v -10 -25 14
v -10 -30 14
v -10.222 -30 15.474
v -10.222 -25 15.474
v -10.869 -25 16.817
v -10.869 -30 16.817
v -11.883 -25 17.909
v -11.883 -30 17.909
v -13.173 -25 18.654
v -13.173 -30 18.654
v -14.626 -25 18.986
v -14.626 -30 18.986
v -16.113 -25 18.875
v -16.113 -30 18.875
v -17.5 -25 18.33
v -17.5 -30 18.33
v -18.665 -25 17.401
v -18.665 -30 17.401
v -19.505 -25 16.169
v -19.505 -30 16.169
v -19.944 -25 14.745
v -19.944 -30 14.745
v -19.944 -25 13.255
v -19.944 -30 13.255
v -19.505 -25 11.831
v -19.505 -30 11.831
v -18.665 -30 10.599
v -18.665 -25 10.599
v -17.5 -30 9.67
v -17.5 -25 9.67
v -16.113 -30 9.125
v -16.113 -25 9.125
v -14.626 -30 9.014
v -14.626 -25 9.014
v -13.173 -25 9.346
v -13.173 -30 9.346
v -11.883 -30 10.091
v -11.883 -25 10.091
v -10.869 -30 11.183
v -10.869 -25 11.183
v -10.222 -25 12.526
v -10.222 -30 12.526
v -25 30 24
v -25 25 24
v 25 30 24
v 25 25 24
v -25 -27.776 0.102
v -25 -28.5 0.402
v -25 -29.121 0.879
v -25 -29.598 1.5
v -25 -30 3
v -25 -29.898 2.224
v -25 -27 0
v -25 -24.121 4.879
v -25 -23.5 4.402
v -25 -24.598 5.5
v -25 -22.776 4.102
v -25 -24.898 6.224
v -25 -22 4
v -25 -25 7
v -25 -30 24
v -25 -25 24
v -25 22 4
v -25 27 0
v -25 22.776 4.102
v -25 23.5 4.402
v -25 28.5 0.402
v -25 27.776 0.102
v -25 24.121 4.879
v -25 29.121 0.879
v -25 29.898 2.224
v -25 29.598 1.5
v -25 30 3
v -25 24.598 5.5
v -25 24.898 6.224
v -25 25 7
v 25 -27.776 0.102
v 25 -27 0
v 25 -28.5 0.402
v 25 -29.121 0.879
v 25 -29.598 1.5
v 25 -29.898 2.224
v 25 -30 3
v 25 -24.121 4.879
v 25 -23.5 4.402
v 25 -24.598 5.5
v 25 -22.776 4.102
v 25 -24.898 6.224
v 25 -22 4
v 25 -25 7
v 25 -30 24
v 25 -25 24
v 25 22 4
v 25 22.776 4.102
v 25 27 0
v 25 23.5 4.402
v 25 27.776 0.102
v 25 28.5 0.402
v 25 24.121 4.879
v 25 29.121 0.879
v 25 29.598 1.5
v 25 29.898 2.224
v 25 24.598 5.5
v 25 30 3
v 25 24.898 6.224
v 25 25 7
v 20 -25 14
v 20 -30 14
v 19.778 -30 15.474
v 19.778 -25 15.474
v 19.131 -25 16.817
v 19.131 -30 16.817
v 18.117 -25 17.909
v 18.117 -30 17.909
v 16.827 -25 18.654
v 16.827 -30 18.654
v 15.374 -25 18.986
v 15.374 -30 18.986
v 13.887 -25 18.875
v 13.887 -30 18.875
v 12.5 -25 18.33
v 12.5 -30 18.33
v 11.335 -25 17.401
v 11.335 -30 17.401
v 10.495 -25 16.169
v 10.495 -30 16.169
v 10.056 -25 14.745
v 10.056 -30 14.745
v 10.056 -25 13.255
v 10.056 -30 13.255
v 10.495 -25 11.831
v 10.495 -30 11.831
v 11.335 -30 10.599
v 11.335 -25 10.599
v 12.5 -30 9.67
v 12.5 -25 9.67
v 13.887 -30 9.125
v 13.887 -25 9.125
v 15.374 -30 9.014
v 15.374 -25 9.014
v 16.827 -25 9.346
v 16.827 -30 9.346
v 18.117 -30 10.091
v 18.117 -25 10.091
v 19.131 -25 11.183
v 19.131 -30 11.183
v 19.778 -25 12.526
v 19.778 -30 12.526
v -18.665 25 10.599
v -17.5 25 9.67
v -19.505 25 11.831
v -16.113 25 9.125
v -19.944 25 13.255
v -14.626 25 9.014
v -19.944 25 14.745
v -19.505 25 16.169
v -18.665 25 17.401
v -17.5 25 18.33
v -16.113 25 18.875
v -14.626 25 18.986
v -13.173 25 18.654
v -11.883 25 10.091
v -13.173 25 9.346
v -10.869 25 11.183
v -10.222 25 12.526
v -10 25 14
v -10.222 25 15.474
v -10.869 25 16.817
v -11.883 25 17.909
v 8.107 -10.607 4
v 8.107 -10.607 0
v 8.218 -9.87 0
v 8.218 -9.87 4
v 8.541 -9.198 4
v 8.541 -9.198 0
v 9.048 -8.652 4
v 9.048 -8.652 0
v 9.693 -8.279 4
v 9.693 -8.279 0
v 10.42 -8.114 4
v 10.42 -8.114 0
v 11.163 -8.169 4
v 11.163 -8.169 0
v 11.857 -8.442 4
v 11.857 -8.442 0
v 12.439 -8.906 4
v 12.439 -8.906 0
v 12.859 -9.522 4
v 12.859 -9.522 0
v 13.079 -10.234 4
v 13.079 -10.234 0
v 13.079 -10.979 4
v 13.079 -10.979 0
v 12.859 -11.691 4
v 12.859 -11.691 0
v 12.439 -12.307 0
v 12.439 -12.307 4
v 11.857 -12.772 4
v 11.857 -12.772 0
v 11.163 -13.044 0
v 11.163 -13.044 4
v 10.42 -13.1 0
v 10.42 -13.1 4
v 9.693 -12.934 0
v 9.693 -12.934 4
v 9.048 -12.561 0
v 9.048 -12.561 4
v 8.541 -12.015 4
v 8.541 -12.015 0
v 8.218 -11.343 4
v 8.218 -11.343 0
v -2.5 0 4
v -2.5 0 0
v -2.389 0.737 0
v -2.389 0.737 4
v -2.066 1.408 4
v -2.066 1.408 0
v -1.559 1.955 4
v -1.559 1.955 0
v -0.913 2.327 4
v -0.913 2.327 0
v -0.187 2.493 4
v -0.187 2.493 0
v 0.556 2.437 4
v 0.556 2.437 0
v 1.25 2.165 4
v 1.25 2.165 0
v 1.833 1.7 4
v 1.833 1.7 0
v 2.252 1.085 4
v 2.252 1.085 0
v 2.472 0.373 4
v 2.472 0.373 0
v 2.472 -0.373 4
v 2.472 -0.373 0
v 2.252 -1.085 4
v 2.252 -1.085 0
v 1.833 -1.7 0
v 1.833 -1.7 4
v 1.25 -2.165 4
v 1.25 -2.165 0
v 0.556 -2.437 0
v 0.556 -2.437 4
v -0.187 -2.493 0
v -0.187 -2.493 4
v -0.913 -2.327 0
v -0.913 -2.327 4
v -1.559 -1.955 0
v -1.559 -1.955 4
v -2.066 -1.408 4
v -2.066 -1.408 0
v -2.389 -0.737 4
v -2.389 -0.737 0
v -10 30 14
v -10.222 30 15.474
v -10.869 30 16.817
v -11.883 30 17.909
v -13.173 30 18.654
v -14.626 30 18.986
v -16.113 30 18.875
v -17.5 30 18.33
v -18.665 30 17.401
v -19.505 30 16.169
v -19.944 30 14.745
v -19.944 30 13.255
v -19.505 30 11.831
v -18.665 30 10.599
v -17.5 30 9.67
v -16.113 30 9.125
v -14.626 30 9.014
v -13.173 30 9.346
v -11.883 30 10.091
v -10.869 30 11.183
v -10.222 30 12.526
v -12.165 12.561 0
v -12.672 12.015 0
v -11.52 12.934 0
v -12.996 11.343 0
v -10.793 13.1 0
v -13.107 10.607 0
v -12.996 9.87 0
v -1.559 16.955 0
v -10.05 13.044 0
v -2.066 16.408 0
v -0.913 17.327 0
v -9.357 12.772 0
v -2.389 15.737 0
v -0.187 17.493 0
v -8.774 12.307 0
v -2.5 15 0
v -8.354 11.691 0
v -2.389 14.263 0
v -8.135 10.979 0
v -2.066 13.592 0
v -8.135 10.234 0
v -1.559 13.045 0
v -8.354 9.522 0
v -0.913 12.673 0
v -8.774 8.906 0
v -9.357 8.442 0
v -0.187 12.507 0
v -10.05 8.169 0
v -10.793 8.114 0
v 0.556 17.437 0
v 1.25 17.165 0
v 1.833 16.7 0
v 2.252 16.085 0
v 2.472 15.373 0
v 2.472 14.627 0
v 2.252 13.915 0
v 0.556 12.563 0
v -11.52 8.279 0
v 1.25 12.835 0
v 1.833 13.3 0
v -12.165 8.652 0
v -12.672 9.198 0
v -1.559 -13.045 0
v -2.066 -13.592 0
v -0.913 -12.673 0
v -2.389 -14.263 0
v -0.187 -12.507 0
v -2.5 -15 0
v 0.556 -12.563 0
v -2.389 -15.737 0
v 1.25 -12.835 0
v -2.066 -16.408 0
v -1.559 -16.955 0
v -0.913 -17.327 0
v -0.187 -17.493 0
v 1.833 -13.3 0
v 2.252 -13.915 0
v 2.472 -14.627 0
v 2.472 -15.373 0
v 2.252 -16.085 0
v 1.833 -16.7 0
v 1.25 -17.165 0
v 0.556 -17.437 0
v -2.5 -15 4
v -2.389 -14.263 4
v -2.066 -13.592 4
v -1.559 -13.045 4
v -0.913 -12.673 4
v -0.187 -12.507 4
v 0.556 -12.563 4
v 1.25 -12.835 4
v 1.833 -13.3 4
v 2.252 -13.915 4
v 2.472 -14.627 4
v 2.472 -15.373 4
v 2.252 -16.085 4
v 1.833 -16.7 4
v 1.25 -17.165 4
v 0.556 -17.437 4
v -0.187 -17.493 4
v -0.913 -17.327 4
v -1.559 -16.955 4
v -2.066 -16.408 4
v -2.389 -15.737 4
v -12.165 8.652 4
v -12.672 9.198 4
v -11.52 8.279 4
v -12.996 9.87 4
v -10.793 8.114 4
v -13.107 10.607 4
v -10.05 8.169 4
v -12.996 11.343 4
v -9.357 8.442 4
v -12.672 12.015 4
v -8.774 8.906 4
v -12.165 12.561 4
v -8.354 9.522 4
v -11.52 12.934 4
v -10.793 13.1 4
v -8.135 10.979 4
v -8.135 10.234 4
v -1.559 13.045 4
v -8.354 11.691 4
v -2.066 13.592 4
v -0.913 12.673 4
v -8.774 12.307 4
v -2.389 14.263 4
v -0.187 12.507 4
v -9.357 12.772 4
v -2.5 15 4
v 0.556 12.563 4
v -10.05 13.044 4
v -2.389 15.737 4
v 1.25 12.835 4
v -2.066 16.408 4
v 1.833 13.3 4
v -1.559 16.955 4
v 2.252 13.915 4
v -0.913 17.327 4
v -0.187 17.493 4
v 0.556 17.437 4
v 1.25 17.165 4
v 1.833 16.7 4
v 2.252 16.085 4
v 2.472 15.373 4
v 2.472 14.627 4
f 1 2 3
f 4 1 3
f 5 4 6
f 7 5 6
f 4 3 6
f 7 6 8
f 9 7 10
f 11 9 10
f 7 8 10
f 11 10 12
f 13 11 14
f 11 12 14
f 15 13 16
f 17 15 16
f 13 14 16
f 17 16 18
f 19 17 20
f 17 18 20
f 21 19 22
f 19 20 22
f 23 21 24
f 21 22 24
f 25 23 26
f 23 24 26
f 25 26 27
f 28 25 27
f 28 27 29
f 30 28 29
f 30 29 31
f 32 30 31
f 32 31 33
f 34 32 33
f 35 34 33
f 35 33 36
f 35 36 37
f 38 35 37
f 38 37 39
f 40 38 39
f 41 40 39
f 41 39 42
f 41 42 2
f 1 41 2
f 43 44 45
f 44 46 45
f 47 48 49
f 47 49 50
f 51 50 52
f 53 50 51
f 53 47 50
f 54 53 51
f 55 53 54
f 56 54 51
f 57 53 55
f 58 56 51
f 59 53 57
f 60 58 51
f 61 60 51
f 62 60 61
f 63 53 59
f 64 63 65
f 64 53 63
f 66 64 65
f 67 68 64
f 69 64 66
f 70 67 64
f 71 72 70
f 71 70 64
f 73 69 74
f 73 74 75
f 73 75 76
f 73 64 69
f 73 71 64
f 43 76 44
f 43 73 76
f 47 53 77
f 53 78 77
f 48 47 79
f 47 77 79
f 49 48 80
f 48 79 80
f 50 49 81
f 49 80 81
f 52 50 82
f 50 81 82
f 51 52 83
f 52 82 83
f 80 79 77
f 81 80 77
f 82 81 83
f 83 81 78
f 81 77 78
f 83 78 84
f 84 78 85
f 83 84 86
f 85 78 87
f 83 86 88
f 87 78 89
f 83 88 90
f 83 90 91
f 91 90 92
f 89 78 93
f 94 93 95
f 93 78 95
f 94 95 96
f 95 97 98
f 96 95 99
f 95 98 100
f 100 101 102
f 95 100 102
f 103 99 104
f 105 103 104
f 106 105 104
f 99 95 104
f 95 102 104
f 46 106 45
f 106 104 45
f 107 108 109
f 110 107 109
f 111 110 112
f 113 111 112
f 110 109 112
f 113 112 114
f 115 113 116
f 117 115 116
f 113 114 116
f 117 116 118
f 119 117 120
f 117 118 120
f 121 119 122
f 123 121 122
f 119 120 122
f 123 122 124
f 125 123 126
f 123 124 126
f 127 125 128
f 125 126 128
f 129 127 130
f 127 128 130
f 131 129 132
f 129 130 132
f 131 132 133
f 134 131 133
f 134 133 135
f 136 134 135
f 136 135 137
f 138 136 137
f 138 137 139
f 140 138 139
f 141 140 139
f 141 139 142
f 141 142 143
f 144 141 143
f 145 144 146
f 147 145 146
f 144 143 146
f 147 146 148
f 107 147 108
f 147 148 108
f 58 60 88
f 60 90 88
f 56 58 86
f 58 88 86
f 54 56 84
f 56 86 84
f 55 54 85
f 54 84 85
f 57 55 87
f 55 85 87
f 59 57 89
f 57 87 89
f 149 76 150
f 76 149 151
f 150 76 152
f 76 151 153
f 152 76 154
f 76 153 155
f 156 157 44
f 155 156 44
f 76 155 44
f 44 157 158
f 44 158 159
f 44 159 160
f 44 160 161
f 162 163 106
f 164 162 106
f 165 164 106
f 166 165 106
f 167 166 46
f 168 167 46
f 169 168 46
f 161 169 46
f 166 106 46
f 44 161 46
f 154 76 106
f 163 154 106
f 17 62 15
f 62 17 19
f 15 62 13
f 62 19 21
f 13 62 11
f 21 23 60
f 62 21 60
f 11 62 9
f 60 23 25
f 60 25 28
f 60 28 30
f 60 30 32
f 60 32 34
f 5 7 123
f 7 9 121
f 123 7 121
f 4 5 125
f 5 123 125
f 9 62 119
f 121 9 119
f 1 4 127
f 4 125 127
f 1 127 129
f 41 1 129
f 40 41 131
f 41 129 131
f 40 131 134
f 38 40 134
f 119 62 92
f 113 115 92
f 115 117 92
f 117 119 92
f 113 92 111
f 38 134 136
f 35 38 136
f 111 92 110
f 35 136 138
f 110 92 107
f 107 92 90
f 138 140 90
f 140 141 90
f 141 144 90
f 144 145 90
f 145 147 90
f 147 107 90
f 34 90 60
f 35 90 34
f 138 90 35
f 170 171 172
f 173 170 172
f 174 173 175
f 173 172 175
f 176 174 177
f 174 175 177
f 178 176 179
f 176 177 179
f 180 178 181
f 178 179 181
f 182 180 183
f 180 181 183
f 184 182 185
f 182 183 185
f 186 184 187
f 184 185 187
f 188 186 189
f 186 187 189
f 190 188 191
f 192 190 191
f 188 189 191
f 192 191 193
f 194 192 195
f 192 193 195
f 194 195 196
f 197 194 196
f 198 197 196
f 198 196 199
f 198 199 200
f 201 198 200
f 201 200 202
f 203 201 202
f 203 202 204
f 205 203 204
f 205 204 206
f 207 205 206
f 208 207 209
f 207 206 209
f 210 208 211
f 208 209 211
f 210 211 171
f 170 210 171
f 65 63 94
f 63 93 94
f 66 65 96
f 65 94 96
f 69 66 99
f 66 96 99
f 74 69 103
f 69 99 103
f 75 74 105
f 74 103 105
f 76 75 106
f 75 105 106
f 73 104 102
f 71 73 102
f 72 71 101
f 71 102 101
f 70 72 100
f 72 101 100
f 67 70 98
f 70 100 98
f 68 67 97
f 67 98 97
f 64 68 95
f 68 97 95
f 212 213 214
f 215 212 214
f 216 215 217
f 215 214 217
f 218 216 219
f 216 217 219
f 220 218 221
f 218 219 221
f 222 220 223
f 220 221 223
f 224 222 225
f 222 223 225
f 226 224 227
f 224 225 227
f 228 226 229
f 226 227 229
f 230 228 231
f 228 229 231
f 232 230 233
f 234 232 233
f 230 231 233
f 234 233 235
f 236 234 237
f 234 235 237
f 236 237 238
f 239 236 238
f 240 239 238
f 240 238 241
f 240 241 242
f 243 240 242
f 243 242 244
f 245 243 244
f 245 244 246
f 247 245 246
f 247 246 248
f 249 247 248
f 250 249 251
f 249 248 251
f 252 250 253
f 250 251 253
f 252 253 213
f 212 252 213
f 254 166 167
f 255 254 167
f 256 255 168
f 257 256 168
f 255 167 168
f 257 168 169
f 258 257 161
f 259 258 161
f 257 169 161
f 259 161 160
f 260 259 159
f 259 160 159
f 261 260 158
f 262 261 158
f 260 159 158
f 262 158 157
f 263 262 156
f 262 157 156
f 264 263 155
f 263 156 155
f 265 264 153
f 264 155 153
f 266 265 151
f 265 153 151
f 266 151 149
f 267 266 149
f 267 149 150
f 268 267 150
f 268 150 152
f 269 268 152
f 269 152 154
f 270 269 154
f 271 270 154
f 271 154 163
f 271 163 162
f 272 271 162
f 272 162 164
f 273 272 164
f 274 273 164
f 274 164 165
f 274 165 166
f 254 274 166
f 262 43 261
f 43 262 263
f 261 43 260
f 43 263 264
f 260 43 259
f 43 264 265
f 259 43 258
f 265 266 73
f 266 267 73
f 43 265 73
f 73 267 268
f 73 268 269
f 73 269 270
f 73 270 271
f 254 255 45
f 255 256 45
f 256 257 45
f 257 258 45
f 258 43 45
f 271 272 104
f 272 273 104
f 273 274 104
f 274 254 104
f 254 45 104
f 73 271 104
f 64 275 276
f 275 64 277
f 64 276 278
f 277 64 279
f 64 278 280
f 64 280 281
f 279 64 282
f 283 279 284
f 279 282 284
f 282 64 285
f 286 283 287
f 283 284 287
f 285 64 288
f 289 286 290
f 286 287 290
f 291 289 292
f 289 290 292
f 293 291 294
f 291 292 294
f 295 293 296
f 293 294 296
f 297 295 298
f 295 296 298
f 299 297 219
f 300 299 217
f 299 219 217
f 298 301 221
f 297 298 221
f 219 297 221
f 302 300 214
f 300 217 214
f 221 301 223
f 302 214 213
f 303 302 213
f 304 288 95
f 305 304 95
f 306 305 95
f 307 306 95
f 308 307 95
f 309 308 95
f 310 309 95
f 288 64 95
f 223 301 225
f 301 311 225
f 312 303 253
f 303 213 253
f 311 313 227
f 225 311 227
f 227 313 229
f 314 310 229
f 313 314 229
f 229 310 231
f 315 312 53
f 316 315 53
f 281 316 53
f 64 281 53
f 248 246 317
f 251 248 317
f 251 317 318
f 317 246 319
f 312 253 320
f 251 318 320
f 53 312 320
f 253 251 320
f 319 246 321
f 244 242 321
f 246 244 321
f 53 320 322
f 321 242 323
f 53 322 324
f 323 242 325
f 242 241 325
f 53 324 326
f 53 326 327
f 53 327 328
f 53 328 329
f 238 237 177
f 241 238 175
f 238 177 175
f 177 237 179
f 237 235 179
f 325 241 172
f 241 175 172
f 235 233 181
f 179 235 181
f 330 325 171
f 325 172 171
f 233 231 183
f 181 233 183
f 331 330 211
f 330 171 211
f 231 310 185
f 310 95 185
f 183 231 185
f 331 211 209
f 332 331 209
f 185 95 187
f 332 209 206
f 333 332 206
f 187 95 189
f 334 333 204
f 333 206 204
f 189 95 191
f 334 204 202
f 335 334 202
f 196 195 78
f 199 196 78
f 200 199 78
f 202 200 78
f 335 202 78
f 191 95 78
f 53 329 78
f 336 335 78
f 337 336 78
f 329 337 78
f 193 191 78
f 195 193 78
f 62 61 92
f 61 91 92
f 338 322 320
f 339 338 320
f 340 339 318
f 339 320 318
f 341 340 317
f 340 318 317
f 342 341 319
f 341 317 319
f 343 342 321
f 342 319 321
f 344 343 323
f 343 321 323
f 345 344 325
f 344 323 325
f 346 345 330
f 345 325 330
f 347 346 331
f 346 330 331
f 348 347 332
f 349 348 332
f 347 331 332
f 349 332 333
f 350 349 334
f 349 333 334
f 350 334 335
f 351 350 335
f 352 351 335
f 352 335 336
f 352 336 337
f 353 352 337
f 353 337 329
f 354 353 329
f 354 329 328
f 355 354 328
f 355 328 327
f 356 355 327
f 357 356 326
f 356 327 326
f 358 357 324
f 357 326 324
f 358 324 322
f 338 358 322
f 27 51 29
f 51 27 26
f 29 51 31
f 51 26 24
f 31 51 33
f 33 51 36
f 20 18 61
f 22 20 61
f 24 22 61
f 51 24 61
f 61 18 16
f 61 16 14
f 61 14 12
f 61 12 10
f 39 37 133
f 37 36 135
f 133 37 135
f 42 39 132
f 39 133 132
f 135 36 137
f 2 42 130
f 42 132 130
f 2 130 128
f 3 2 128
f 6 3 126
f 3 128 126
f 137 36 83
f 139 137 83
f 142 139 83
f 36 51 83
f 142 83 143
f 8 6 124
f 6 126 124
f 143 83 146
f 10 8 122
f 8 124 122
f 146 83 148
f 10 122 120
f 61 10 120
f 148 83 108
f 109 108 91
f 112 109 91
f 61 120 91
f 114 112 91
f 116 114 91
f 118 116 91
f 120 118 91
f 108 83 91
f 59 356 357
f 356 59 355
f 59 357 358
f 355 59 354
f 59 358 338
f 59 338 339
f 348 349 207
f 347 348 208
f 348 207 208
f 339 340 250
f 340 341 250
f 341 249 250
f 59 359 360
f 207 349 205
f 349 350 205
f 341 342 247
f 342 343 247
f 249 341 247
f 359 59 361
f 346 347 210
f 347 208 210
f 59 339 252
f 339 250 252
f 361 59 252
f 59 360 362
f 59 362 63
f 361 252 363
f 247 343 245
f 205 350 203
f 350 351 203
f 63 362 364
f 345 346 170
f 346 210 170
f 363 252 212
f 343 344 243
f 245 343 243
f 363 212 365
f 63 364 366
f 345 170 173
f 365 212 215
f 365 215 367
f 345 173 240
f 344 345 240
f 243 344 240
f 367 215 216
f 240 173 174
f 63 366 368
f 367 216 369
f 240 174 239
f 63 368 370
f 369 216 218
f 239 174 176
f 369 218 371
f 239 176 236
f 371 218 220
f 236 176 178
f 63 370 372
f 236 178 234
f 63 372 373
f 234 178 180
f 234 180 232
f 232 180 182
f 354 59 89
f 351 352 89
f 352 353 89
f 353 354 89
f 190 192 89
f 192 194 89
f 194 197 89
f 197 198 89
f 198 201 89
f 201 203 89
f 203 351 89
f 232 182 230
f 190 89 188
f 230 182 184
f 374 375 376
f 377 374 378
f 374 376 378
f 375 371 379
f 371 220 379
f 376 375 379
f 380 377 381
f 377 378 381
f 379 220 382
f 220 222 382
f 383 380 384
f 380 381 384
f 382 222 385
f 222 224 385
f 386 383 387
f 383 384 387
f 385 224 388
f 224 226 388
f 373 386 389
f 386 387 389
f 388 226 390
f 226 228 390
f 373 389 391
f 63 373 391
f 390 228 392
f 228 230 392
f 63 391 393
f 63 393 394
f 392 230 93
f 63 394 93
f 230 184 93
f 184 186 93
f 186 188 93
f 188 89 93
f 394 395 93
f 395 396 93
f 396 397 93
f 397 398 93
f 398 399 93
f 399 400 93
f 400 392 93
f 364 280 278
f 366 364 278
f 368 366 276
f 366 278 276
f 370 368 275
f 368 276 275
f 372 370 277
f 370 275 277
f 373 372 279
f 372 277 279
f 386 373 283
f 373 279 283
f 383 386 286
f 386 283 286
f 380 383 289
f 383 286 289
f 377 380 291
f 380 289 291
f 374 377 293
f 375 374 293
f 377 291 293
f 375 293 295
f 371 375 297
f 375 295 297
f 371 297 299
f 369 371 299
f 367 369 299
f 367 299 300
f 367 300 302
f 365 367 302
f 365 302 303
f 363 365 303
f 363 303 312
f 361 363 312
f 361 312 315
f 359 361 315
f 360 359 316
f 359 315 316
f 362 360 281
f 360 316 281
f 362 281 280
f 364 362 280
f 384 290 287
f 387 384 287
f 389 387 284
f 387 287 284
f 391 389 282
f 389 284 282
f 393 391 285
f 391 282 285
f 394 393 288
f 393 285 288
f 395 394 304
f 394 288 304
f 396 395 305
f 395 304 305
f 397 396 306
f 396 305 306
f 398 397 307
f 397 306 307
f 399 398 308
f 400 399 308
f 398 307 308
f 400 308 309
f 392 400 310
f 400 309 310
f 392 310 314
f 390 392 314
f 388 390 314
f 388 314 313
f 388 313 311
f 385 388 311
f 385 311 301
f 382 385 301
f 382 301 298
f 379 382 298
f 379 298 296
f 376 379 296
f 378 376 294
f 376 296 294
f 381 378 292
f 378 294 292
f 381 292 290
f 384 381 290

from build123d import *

# Parameters (mm, degrees)
BOSS_EXTRUDE1_DEPTH = 25
SKETCH2_R           = 2.5
CUT_EXTRUDE1_DEPTH  = 4
SKETCH5_R           = 5
CUT_EXTRUDE2_DEPTH  = 60
SKETCH5_3_R         = 5
CUT_EXTRUDE3_DEPTH  = 5


with BuildPart() as part:
    # Sketch1 → Boss-Extrude1 (new body, symmetric)
    with BuildSketch(Plane(origin=(0, 0, 0), x_dir=(0, 0, -1), z_dir=(1, 0, 0))):
        with BuildLine():
            Line((0, 27), (0, -27))
            ThreePointArc((0, -27), (-0.878679656, -29.121320344), (-3, -30))
            Line((-3, -30), (-24, -30))
            Line((-24, -30), (-24, -25))
            Line((-24, -25), (-7, -25))
            ThreePointArc((-7, -25), (-4.878679656, -24.121320344), (-4, -22))
            Line((-4, -22), (-4, 22))
            ThreePointArc((-4, 22), (-4.878679656, 24.121320344), (-7, 25))
            Line((-7, 25), (-24, 25))
            Line((-24, 25), (-24, 30))
            Line((-24, 30), (-3, 30))
            ThreePointArc((-3, 30), (-0.878679656, 29.121320344), (0, 27))
        make_face()
    extrude(amount=BOSS_EXTRUDE1_DEPTH, both=True)

    # Sketch2 → Cut-Extrude1 (cut)
    with BuildSketch(Plane(origin=(0, 0, 0), x_dir=(-1, 0, 0), z_dir=(0, 0, -1))):
        Circle(SKETCH2_R)
        with Locations((0, 15)):
            Circle(SKETCH2_R)
        with Locations((10.606601718, 10.606601718)):
            Circle(SKETCH2_R)
        with Locations((-10.606601718, -10.606601718)):
            Circle(SKETCH2_R)
        with Locations((0, -15)):
            Circle(SKETCH2_R)
    extrude(amount=-CUT_EXTRUDE1_DEPTH, mode=Mode.SUBTRACT)

    # Sketch5 → Cut-Extrude2 (cut)
    with BuildSketch(Plane.XZ.offset(30)):
        with Locations((-15, 14)):
            Circle(SKETCH5_R)
    extrude(amount=-CUT_EXTRUDE2_DEPTH, mode=Mode.SUBTRACT)

    # Sketch5<3> → Cut-Extrude3 (cut)
    with BuildSketch(Plane.XZ.offset(30)):
        with Locations((15, 14)):
            Circle(SKETCH5_3_R)
    extrude(amount=-CUT_EXTRUDE3_DEPTH, mode=Mode.SUBTRACT)


solid = part.part
